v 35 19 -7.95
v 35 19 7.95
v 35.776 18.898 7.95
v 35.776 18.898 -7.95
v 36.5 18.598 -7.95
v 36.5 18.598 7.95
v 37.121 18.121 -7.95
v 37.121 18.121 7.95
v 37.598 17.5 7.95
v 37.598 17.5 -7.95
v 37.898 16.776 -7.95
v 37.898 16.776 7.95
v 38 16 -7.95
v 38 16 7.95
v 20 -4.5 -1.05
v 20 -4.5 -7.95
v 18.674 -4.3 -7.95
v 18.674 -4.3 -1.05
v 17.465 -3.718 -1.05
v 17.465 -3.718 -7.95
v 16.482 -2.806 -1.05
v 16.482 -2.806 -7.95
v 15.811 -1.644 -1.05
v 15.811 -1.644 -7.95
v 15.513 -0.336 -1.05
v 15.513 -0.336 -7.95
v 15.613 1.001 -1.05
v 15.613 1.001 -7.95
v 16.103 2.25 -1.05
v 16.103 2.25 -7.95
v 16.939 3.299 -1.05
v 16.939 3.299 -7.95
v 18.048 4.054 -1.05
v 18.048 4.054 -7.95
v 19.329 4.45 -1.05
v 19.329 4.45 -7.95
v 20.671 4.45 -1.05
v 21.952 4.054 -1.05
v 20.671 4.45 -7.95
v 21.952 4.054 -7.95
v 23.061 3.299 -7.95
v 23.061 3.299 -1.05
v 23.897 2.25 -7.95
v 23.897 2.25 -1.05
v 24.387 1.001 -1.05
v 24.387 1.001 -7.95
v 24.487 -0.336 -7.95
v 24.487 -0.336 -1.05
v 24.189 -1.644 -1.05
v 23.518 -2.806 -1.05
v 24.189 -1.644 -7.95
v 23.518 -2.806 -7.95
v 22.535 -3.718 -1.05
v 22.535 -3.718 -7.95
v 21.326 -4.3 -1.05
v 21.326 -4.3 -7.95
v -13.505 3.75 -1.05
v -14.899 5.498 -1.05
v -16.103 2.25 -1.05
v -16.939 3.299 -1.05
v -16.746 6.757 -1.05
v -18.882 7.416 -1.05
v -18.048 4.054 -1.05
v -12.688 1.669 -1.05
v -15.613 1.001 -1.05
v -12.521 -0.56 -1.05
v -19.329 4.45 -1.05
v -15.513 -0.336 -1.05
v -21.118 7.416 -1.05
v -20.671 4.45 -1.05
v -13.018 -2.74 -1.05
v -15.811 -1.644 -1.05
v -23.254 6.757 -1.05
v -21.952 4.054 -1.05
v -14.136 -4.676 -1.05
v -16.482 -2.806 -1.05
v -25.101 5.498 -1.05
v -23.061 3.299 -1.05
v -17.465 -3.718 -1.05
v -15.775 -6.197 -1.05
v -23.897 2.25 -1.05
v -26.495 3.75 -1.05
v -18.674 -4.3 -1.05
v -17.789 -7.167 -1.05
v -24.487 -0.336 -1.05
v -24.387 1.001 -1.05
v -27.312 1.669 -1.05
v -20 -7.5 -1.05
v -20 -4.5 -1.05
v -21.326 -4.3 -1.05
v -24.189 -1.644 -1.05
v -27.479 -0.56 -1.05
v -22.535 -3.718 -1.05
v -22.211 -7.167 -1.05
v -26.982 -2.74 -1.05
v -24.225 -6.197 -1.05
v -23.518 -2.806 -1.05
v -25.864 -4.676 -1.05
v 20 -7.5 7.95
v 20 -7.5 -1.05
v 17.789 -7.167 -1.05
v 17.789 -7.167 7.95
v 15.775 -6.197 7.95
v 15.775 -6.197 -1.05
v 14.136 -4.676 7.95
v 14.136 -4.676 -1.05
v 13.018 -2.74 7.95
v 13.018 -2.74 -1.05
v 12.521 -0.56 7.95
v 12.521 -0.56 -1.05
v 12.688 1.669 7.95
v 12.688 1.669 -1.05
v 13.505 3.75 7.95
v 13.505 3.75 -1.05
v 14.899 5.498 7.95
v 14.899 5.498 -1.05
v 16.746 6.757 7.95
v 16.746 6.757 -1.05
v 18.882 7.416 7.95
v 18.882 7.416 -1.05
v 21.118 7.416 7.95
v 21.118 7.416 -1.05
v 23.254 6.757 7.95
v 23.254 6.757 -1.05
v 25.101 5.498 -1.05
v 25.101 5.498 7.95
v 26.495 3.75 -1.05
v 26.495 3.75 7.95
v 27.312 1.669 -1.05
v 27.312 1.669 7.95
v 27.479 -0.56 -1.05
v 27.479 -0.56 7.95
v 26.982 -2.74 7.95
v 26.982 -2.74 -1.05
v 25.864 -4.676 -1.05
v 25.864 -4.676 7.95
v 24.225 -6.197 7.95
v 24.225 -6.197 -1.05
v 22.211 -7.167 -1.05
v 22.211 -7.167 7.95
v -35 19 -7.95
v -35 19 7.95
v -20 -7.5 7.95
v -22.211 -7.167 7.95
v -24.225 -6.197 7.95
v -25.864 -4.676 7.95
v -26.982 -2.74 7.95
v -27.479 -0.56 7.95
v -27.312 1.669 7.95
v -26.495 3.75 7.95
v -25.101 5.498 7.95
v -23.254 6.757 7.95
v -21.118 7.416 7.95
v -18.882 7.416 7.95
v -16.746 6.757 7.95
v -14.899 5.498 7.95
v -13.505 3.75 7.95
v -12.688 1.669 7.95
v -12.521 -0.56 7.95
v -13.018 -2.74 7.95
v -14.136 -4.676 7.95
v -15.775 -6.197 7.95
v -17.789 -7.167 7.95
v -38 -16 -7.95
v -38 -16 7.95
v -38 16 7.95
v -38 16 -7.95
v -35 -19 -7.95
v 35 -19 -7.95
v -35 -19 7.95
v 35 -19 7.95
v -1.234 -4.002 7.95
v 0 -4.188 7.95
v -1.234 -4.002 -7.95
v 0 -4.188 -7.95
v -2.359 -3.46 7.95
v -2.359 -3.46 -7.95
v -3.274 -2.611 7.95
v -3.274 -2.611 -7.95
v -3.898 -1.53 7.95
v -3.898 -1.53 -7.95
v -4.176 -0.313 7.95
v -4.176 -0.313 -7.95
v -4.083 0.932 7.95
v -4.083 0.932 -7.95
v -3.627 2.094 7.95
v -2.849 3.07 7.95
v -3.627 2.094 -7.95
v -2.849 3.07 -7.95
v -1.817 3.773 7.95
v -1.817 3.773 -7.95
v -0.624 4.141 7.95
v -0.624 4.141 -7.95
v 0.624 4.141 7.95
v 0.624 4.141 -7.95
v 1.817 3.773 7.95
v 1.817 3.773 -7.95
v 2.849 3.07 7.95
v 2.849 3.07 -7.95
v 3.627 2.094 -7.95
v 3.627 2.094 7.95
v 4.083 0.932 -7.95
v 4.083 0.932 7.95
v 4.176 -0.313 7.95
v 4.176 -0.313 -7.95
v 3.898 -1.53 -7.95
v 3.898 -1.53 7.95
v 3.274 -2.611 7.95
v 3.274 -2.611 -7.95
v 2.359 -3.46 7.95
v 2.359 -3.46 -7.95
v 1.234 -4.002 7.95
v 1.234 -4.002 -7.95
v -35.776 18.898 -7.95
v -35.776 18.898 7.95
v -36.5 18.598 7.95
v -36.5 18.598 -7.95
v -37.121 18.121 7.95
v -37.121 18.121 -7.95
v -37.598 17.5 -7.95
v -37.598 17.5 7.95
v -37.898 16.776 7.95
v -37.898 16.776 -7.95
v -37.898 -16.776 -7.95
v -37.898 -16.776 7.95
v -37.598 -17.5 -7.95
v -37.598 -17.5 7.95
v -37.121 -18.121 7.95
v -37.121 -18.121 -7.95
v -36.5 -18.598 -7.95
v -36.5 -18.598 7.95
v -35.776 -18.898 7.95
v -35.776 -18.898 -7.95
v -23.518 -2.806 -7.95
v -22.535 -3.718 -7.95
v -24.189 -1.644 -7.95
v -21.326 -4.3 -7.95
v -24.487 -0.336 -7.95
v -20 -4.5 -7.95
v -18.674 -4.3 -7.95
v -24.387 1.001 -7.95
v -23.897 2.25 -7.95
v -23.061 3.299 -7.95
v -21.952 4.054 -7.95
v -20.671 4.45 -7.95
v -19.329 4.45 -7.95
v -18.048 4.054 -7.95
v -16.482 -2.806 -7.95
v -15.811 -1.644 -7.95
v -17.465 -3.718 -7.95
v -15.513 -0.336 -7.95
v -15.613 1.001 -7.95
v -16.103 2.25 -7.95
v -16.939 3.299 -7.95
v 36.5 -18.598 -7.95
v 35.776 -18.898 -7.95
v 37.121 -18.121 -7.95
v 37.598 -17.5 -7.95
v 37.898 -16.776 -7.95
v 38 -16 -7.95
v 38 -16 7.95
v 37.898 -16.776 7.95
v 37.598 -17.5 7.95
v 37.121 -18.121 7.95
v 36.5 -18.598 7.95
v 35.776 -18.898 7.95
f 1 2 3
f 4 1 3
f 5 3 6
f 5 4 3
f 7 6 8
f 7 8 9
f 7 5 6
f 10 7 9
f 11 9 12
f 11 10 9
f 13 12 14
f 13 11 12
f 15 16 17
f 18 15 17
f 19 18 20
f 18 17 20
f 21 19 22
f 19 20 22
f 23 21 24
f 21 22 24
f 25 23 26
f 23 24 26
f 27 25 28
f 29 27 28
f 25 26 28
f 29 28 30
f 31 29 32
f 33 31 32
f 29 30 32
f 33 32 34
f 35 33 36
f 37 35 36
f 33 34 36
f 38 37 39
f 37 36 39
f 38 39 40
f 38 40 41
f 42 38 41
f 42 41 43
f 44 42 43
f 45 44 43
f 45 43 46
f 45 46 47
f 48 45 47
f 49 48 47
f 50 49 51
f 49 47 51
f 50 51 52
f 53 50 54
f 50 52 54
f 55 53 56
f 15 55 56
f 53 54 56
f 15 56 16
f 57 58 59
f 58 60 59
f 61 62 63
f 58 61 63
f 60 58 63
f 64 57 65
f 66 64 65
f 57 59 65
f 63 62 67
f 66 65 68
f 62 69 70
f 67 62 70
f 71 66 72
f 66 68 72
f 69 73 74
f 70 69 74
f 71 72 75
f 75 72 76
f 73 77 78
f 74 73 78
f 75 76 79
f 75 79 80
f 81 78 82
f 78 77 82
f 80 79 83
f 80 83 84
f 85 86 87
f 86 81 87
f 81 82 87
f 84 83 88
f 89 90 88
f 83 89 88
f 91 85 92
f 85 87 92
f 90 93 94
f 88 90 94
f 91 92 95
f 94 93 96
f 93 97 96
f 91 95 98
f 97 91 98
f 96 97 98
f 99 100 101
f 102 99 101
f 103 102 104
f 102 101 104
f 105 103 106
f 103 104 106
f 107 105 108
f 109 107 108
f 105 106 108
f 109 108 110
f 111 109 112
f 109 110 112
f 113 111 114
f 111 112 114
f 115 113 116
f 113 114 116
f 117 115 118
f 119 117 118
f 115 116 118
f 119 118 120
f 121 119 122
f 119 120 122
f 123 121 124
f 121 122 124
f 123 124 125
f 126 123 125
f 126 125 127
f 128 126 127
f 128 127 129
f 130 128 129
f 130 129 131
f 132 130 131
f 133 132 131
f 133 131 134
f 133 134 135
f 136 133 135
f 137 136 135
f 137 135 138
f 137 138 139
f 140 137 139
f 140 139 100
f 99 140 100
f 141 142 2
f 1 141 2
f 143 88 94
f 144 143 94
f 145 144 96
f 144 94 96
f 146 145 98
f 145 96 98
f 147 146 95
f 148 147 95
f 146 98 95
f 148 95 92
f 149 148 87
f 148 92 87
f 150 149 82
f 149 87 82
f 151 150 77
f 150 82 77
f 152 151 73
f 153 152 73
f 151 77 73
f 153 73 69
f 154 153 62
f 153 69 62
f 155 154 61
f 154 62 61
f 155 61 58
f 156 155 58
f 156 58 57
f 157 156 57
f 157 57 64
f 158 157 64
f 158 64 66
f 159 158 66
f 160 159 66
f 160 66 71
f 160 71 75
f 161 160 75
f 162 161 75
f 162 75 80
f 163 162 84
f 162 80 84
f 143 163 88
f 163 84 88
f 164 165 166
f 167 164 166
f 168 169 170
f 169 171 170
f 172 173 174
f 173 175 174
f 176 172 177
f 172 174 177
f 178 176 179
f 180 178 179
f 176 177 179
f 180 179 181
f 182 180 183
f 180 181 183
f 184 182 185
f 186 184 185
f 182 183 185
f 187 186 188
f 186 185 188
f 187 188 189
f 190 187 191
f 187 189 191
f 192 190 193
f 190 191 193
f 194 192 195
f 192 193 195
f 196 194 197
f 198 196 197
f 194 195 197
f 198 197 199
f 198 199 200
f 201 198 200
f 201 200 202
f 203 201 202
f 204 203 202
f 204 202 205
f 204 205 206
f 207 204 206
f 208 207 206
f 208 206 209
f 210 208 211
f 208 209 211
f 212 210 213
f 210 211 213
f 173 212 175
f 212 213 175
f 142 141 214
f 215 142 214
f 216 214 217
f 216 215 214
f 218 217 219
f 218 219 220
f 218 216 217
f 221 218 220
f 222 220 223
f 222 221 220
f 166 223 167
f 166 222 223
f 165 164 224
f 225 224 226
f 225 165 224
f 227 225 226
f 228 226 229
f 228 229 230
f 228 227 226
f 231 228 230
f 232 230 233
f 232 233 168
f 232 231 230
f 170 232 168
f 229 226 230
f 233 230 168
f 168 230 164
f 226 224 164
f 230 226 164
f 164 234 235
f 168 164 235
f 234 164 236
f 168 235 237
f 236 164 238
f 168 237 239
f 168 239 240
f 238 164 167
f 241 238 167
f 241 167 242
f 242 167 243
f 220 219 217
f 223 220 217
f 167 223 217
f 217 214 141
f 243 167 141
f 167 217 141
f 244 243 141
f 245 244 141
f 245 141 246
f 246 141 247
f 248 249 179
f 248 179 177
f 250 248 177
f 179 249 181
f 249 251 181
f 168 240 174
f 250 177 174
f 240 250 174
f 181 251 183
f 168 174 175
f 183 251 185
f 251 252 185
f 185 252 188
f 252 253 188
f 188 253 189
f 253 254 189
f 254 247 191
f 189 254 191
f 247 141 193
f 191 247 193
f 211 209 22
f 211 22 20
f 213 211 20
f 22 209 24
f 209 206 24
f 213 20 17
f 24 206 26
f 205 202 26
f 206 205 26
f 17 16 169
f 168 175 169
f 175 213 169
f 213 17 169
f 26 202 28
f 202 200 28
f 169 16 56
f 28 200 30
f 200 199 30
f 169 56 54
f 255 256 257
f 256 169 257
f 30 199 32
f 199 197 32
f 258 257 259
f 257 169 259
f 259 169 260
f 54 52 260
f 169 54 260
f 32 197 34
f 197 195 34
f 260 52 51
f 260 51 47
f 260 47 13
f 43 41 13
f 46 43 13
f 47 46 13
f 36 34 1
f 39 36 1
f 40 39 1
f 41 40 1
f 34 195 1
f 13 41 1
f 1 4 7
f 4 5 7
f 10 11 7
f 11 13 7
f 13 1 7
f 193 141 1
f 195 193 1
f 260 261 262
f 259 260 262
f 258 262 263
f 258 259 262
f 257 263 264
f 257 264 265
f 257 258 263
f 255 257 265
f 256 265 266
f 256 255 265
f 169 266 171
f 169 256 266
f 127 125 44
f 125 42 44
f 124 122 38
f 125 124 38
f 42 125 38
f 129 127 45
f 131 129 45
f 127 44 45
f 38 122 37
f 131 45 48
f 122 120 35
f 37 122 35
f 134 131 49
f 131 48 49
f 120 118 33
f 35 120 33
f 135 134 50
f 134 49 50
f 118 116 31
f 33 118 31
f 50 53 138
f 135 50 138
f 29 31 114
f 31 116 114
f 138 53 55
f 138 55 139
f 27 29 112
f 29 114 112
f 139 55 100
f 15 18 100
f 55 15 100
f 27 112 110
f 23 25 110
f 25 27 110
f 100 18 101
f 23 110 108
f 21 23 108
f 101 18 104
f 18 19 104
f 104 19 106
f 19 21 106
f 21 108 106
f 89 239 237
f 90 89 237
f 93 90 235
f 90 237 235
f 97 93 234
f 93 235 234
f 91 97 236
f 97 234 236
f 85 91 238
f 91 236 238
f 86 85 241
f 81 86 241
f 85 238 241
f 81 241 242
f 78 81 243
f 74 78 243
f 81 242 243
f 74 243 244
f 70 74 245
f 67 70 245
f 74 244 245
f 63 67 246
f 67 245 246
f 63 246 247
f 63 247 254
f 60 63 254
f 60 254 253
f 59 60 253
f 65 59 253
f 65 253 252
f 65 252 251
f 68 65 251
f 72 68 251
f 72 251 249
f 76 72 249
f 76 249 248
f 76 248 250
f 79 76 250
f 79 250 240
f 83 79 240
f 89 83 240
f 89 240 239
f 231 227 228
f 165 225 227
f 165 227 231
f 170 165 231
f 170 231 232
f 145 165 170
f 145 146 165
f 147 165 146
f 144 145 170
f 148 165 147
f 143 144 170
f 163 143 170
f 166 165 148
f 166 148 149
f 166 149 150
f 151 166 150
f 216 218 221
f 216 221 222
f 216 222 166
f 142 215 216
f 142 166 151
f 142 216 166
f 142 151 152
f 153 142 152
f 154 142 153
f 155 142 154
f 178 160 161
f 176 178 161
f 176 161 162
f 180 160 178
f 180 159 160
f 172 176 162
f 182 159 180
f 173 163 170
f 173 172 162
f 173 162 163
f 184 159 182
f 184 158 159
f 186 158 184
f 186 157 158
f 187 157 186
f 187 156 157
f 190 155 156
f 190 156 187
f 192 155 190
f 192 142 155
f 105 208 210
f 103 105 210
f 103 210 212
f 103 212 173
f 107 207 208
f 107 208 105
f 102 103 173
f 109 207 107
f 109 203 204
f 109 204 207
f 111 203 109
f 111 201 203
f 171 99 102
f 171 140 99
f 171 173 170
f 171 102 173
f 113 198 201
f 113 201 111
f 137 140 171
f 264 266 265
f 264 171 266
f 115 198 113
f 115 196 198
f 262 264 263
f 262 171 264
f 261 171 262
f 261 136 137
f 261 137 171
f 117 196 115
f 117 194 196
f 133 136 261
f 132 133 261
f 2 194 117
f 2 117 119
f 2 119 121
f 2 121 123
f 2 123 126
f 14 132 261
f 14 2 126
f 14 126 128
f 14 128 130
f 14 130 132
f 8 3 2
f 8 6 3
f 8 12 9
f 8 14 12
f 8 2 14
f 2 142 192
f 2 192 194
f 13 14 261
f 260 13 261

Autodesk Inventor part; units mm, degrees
ref_plane "YZ Plane" through (0, 0, 0) normal (1, 0, 0) x (0, 1, 0)
ref_plane "XZ Plane" through (0, 0, 0) normal (0, 1, 0) x (-1, 0, 0)
ref_plane "XY Plane" through (0, 0, 0) normal (0, 0, 1) x (1, 0, 0)
sketch "Sketch1" plane through (0, 0, 0) normal (0, 0, 1) x (1, 0, 0)
  line L0 (-38, 19) -> (38, 19)
  line L1 (38, 19) -> (38, -19)
  line L2 (38, -19) -> (-38, -19)
  line L3 (-38, -19) -> (-38, 19)
  point P0 (0, 0)
  point P1 (0, 19)
  point P2 (-38, 0)
  dimension "Dim_A" = 76
  dimension "Dim_B" = 38
extrude "Base" add sketch "Sketch1" against normal mid plane 15.9
sketch "Sketch2" plane through (0, 0, 7.95) normal (0, 0, 1) x (1, 0, 0)
  line L0 (0, -26.6) -> (0, 26.6) construction
  line L1 (-53.2, 0) -> (53.2, 0) construction
  point P0 (0, 0)
  point P1 (0, 0)
  point P2 (-20, 0)
  dimension "Dim_D1" = 0
  dimension "Dim_D" = 40
hole "MountHole" at (-20, 0, 7.95) direction (0, 0, -1) diameter 9 end through all counterbore diameter 15 counterbore depth 9
hole "CenterHole" at (0, 0, 7.95) direction (0, 0, -1) diameter 8.376 end through all thread size "M10x1.5" class "6H" standard "ANSI Metric M Profile"
pattern_linear "Mount Hole Pattern" count 2 spacing 40 along (1, 0, 0) of "MountHole"
fillet "Fillet1" radius 3 4 edges at (-38, -19, 0) (-38, 19, 0) (38, 19, 0) (38, -19, 0)
properties part number "21-002" material "Steel, High Strength Low Alloy"
